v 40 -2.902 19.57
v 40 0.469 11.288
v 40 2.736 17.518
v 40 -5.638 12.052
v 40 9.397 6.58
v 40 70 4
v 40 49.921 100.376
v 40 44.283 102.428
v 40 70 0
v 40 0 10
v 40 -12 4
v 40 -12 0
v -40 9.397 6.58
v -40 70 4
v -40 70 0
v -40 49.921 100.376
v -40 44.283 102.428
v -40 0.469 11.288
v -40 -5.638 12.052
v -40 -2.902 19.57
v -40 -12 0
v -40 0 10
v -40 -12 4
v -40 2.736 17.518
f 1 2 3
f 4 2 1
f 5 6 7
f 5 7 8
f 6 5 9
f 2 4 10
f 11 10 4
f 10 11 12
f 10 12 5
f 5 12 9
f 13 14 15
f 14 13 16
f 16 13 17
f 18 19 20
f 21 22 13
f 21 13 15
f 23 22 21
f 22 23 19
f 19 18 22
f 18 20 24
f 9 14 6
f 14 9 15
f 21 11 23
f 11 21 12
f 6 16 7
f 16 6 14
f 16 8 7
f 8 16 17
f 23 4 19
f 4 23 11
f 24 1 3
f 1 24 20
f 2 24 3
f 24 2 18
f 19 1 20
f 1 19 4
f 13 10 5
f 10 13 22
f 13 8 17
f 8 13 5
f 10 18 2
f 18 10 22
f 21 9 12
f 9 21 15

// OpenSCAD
// Reference solution for `phone_stand`: checks the grader, never shown to agents.
module posed() translate([-40, 0, 10]) rotate([-20, 0, 0]) children();
module stand() intersection() {
    // Nothing below the table.
    translate([-100, -100, 0]) cube([200, 300, 200]);
    difference() {
        union() {
            // Base plate from y = -12 to y = 70.
            translate([-40, -12, 0]) cube([80, 82, 4]);
            // The back rest and the ledge, in the phone's frame.
            hull() {
                posed() translate([0, 10, -8]) cube([80, 6, 110]);
                translate([-40, 40, 0]) cube([80, 30, 4]);
            }
            // Ledge under the phone and a lip in front.
            hull() {
                posed() translate([0, -6, -8]) cube([80, 22, 8]);
                translate([-40, -12, 0]) cube([80, 40, 4]);
            }
            posed() translate([0, -6, -8]) cube([80, 6, 16]);
        }
        // The phone, with nothing overlapping it.
        posed() cube([80, 10, 200]);
    }
}
stand();
